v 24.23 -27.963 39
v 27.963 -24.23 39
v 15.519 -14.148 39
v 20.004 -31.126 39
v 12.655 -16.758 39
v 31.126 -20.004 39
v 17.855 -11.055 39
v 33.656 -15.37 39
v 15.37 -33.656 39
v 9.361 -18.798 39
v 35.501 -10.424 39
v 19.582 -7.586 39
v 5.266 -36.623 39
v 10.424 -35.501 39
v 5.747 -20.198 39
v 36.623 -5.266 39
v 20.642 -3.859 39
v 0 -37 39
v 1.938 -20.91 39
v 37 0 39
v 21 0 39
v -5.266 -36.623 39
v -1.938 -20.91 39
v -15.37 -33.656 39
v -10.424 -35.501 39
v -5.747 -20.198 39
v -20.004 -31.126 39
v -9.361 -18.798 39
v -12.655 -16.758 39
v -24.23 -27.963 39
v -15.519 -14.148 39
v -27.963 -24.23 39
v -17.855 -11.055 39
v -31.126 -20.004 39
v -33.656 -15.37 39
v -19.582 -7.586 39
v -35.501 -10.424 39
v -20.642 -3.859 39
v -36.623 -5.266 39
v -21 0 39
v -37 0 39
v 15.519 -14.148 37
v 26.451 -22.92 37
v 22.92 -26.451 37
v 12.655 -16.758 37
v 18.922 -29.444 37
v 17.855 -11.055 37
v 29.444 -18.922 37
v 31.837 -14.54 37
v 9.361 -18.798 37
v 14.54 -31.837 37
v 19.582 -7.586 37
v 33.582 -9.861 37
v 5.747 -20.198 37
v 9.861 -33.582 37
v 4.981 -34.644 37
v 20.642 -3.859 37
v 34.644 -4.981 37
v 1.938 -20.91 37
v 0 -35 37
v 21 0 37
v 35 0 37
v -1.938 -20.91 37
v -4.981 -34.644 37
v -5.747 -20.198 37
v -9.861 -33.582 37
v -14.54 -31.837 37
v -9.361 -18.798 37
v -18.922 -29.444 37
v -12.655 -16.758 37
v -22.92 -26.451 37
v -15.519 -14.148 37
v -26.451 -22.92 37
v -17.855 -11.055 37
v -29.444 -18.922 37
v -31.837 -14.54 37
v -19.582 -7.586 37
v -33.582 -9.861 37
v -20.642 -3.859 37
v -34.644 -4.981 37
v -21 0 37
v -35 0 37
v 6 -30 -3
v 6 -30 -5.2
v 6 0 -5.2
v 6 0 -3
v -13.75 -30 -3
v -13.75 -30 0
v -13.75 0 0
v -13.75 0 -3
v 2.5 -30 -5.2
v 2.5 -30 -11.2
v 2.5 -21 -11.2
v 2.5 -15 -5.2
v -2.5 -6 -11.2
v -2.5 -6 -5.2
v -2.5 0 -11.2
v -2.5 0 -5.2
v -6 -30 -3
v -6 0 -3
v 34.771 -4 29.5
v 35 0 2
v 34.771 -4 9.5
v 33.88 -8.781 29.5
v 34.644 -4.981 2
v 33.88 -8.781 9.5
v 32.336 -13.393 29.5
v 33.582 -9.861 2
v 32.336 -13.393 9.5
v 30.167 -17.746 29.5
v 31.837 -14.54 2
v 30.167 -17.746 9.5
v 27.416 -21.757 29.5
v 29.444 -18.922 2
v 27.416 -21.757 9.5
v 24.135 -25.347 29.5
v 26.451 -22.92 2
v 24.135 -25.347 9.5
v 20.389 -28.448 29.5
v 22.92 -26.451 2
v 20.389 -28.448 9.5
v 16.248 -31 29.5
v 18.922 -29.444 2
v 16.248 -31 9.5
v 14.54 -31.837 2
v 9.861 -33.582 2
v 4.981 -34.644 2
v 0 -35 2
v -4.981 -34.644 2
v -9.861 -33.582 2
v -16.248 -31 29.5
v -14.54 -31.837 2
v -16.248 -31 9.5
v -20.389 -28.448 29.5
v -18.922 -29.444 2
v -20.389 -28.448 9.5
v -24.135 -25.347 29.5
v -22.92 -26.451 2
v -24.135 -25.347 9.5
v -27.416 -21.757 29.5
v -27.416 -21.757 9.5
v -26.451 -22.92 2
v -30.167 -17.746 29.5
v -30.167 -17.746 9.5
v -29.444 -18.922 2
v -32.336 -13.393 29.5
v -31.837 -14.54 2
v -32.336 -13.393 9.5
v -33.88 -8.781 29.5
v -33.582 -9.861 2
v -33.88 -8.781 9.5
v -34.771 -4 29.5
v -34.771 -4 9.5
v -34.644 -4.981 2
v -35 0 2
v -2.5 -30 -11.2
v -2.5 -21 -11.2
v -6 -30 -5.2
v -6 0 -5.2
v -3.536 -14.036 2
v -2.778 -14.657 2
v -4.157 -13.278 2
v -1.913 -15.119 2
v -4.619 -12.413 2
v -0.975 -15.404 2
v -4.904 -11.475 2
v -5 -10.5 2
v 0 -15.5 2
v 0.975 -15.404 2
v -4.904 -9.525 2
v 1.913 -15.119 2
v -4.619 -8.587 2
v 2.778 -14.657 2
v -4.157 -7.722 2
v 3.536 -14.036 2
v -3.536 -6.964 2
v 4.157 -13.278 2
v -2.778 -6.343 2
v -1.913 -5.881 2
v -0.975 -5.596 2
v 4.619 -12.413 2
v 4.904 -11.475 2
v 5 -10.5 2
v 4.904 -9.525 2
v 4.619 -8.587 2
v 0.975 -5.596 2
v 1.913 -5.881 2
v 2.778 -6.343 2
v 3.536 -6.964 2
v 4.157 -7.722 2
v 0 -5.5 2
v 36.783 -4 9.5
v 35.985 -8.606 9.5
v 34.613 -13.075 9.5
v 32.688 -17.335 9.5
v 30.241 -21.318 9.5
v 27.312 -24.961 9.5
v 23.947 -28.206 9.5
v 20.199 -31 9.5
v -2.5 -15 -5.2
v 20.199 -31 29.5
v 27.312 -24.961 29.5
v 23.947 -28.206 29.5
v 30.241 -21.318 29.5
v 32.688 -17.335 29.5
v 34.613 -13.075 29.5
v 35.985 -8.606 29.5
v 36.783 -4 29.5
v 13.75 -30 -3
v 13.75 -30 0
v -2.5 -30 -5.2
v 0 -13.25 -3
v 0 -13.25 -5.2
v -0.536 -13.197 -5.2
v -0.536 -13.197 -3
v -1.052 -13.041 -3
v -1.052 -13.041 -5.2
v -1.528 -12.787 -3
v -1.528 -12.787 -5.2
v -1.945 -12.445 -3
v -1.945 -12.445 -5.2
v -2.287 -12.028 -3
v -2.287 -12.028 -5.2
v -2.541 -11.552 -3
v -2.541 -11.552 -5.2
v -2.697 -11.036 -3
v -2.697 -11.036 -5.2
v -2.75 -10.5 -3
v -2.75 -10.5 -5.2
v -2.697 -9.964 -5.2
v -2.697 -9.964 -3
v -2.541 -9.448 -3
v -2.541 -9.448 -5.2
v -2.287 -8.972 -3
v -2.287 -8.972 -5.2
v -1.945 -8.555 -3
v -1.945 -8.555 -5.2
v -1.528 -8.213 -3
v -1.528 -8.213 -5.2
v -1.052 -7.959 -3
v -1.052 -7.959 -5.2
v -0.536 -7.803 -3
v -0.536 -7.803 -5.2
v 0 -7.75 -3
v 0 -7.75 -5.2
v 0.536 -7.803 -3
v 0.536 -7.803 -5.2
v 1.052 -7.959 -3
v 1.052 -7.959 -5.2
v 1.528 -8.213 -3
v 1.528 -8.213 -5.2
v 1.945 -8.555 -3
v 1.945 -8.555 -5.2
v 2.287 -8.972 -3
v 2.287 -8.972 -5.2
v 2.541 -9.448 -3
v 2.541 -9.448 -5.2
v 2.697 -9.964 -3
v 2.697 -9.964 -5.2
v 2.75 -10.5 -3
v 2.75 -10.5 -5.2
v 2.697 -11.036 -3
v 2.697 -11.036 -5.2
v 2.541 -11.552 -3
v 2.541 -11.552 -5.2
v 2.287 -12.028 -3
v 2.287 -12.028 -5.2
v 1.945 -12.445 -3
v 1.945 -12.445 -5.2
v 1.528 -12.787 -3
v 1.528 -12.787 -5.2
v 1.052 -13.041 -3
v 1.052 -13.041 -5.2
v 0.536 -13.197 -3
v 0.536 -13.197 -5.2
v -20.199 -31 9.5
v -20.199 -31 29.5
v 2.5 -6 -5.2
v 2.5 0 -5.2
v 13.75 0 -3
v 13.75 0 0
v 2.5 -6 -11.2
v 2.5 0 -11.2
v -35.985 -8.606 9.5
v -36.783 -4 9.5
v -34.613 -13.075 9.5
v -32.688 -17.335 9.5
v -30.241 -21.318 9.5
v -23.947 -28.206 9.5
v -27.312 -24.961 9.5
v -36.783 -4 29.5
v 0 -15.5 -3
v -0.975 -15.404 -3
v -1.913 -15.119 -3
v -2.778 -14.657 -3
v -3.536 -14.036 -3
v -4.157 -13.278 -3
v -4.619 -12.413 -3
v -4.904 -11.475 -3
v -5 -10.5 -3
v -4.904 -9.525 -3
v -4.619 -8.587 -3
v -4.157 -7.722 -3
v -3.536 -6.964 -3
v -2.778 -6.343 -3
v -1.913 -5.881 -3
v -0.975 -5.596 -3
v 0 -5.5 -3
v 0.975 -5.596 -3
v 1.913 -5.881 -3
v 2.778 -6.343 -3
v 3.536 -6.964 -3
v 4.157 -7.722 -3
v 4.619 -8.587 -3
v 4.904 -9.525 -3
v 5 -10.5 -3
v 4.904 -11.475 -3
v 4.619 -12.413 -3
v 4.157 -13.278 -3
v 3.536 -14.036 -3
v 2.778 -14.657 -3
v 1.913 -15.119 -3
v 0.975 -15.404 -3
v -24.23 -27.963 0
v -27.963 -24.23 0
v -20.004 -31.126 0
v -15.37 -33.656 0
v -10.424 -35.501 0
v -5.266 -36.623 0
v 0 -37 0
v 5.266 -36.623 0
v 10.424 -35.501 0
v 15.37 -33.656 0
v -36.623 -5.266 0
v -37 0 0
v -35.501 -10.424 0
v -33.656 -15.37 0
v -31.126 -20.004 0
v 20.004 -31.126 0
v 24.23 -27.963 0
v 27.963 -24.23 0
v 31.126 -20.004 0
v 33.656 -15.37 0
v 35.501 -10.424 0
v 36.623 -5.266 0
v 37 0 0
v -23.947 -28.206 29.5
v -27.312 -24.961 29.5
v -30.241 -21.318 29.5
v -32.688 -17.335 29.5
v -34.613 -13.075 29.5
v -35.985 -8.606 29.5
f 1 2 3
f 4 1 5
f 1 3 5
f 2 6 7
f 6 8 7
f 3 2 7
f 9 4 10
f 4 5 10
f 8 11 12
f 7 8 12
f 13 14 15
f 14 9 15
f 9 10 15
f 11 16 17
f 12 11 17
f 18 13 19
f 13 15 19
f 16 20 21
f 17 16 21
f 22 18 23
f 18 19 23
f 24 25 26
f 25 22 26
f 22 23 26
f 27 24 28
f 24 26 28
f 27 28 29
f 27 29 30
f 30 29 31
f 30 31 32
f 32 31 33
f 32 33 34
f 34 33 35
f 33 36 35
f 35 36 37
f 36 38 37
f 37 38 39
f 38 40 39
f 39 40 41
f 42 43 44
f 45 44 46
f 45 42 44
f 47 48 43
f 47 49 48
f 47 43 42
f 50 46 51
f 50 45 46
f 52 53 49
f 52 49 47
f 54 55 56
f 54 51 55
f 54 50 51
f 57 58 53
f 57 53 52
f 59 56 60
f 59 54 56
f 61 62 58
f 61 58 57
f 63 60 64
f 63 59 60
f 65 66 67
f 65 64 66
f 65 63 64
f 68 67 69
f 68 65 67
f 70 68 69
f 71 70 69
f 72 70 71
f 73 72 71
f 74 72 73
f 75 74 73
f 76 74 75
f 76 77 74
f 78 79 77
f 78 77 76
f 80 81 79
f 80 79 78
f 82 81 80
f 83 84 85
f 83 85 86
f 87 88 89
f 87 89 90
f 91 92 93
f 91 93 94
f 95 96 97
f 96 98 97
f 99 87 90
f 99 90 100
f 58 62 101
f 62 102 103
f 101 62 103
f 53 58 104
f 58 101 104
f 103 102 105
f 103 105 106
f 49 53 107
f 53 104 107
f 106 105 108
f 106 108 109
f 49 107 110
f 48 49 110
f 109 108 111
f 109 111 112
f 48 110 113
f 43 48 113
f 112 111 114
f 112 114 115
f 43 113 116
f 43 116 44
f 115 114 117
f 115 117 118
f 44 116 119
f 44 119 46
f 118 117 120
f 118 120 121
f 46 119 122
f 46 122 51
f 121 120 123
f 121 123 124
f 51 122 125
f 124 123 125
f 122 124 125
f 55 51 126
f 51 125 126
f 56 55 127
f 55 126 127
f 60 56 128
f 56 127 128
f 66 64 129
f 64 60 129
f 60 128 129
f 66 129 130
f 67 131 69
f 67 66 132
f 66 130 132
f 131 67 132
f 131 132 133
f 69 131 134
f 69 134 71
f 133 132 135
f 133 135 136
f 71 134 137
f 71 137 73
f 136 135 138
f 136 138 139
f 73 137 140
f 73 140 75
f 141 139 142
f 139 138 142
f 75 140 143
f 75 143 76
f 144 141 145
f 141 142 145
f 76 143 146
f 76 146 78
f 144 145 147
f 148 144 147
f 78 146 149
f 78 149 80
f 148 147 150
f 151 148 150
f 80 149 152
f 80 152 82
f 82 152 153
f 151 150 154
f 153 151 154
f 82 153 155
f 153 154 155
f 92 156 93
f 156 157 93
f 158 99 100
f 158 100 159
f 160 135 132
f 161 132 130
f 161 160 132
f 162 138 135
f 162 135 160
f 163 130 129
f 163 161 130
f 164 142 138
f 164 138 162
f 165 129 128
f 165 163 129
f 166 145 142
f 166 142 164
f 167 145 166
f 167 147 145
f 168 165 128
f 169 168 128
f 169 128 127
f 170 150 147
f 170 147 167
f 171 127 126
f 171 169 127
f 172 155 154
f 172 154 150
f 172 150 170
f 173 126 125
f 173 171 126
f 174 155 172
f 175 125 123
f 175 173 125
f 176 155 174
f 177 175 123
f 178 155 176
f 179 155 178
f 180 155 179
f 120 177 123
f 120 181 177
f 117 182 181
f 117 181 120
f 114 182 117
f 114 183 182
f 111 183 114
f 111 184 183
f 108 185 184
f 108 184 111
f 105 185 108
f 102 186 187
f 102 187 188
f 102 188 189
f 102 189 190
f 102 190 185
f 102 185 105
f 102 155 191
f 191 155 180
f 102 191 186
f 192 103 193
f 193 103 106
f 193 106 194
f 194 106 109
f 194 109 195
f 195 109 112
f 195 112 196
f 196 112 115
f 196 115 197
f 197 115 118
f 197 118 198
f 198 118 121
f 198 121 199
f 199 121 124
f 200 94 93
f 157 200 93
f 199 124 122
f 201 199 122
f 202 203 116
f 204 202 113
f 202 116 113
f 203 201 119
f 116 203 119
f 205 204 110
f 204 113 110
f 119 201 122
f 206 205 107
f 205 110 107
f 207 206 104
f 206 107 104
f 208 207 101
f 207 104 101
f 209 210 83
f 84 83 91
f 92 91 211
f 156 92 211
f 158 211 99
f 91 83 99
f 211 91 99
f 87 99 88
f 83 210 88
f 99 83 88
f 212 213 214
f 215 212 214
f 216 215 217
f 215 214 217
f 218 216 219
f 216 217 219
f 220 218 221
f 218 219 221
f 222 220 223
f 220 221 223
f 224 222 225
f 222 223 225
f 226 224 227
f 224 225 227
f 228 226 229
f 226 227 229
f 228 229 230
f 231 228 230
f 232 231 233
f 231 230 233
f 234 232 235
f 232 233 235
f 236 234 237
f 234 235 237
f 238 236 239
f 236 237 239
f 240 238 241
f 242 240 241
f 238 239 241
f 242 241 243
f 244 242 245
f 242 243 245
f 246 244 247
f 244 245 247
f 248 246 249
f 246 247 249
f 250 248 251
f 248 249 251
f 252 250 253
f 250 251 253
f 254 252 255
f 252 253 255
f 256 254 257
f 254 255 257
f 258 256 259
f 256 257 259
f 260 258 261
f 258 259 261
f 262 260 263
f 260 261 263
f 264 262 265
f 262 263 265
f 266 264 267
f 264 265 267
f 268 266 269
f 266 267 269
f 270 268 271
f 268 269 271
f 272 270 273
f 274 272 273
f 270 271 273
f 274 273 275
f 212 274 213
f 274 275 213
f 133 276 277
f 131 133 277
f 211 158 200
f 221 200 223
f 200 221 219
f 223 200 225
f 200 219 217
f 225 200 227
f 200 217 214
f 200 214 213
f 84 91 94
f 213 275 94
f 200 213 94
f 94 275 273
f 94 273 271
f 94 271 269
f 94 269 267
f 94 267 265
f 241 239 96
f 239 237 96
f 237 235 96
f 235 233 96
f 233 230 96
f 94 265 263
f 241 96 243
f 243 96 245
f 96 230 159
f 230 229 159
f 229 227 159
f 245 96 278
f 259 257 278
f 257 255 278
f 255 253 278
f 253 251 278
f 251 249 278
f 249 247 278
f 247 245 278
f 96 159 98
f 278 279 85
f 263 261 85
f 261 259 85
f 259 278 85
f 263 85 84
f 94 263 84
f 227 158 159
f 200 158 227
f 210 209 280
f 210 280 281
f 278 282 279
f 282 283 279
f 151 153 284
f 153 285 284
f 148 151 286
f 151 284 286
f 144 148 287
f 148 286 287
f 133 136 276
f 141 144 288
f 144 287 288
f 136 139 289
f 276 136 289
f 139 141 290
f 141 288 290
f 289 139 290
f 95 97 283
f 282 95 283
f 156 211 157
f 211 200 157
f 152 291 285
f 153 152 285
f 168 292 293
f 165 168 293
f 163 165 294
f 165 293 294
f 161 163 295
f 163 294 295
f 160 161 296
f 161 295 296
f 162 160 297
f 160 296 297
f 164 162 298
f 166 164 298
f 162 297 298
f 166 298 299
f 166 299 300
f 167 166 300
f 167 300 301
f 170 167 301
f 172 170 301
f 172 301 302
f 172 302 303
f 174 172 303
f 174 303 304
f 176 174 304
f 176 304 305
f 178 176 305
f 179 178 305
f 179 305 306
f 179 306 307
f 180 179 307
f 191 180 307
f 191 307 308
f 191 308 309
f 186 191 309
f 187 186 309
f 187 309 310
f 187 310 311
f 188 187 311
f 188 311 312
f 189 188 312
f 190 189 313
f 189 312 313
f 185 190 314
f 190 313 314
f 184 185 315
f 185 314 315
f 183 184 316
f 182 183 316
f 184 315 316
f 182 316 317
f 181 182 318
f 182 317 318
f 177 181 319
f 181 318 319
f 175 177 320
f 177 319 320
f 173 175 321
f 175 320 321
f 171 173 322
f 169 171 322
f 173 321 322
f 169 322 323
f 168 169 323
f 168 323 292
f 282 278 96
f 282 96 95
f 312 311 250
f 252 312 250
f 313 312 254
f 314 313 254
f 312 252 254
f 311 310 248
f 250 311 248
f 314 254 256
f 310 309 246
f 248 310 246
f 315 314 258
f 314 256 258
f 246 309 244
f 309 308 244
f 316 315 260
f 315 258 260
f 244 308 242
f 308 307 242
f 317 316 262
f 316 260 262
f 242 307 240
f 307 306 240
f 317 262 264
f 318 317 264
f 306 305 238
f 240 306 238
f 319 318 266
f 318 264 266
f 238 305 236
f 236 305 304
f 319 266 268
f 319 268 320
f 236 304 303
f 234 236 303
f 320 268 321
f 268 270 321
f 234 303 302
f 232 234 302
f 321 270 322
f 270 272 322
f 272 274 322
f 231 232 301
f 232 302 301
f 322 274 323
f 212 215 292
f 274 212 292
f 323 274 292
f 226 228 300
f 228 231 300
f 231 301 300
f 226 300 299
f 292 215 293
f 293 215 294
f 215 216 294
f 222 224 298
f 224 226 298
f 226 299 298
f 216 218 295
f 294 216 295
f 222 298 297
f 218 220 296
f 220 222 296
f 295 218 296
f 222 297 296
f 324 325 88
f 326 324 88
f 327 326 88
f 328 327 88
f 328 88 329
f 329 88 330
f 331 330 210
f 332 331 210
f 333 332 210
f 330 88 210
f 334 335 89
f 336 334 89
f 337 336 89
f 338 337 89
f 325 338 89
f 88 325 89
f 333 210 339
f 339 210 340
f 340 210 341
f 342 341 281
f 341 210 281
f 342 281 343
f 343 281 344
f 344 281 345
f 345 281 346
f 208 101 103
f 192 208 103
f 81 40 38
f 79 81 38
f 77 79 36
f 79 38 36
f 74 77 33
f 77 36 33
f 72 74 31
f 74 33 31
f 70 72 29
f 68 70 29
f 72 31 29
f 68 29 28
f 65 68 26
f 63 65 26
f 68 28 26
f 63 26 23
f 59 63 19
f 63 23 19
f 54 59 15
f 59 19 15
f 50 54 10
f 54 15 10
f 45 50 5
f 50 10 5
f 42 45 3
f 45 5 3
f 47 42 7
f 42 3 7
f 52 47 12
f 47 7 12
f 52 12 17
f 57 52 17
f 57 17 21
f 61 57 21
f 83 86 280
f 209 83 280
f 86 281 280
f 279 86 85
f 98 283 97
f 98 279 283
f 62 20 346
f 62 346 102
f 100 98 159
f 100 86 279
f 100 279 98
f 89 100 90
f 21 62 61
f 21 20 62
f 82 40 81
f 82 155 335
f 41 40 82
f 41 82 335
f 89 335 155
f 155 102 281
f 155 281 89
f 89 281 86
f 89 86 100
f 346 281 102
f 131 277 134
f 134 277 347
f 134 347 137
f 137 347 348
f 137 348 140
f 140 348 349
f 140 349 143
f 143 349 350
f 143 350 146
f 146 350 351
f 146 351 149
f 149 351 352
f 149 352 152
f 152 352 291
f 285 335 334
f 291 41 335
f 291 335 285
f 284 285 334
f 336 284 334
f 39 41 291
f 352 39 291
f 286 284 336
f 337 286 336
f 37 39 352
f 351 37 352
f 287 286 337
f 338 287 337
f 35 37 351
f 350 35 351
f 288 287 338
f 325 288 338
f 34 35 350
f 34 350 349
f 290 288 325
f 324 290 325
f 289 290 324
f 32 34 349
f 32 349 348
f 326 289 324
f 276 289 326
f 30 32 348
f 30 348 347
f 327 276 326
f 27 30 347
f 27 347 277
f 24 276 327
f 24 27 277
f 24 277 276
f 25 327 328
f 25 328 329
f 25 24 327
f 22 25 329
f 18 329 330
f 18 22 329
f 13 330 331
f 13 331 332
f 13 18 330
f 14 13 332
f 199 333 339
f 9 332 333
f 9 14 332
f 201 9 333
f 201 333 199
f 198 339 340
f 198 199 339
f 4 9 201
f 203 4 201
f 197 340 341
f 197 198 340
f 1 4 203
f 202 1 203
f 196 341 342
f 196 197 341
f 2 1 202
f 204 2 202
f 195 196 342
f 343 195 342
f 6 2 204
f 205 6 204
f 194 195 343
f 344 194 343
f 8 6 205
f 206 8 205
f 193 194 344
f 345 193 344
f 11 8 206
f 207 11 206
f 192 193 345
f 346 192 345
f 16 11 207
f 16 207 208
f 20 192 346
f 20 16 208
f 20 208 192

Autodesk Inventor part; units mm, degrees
ref_plane "YZ Plane" through (0, 0, 0) normal (1, 0, 0) x (0, 1, 0)
ref_plane "XZ Plane" through (0, 0, 0) normal (0, 1, 0) x (-1, 0, 0)
ref_plane "XY Plane" through (0, 0, 0) normal (0, 0, 1) x (1, 0, 0)
sketch "Sketch1" plane through (0, 0, 0) normal (0, 0, 1) x (1, 0, 0)
  arc A0 (-37, 0) -> (37, 0) centre (0, 0) ccw
  line L0 (-51.8, 0) -> (51.8, 0) construction
  circle A1 centre (0, 0) radius 35 construction
  line L1 (-37, 0) -> (37, 0)
  dimension "d1" = 70
  dimension "d2" = 2
extrude "Extrusion1" add sketch "Sketch1" along normal blind 2
sketch "Sketch2" plane through (0, 0, 2) normal (0, 0, 1) x (1, 0, 0)
  arc A0 (-37, 0) -> (37, 0) centre (0, 0) ccw projected
  arc A1 (-35, 0) -> (35, 0) centre (0, 0) ccw
  line L0 (37, 0) -> (-37, 0) projected
  line L1 (-37, 0) -> (37, 0)
  dimension "d5" = 2
extrude "Extrusion2" add sketch "Sketch2" along normal blind 35 contours L0 A1 A0
ref_plane "Work Plane1" through (0, 0, 19.5) normal (0, 0, 1) x (1, 0, 0)
mirror "Mirror1" about plane through (0, 0, 19.5) normal (0, 0, 1) of "Extrusion1"
sketch "Sketch3" plane through (0, 0, 39) normal (0, 0, 1) x (1, 0, 0)
  circle A0 centre (0, 0) radius 21
  dimension "d8" = 42
extrude "Extrusion3" cut sketch "Sketch3" against normal blind 35
sketch "Sketch4" plane through (0, 0, 0) normal (1, 0, 0) x (0, 1, 0)
  line L0 (-4, 9.5) -> (-31, 9.5)
  line L1 (-31, 9.5) -> (-31, 29.5)
  line L2 (-31, 29.5) -> (-4, 29.5)
  line L3 (-4, 29.5) -> (-4, 9.5)
  line L4 (-44.4, 19.5) -> (7.4, 19.5) construction
  line L5 (0, 0) -> (0, 39) construction
  line L6 (-35, 37) -> (-35, 2) construction
  dimension "d11" = 20
  dimension "d12" = 4
  dimension "d13" = 4
extrude "Extrusion4" cut sketch "Sketch4" along normal through all both and the other way through all
sketch "Sketch5" plane through (0, 0, 0) normal (0, 1, 0) x (-1, 0, 0)
  line L0 (37, 0) -> (-37, 0) projected
  line L1 (0, -31.0583) -> (0, 50.6764) construction
  line L2 (-6, -3) -> (6, -3)
  line L3 (6, -3) -> (6, -5.2)
  line L4 (6, -5.2) -> (-6, -5.2)
  line L5 (-6, -5.2) -> (-6, -3)
  line L6 (-2.5, -5.2) -> (2.5, -5.2)
  line L7 (2.5, -5.2) -> (2.5, -11.2)
  line L8 (2.5, -11.2) -> (-2.5, -11.2)
  line L9 (-2.5, -11.2) -> (-2.5, -5.2)
  line L10 (0, -3) -> (0, -11.2) construction
  line L11 (-37, 0) -> (37, 0) construction
  line L12 (-13.75, 0) -> (13.75, 0)
  line L13 (13.75, 0) -> (13.75, -3)
  line L14 (13.75, -3) -> (-13.75, -3)
  line L15 (-13.75, -3) -> (-13.75, 0)
  dimension "d32" = 2.2
  dimension "d33" = 3.5
  dimension "d34" = 6
  dimension "d35" = 5
  dimension "d36" = 27.5
  dimension "d37" = 3
extrude "Extrusion5" add sketch "Sketch5" against normal blind 30
sketch "Sketch6" plane through (0, 0, 2) normal (0, 0, 1) x (1, 0, 0)
  line L0 (0, 0) -> (0, -21) construction
  arc A0 (-21, 0) -> (21, 0) centre (0, 0) ccw projected
  point P0 (0, -10.5)
hole "Hole1" at (0, -10.5, 2) direction (0, 0, -1) diameter 5.5 end through all counterbore diameter 10 counterbore depth 5 clearance for "Socket Head Cap Screw ISO 4762" size "M5" standard "ISO"
sketch "Sketch7" plane through (-2.5, -30, -11.2) normal (-1, 0, 0) x (0, 0, 1)
  line L0 (6, 30) -> (6, 0) projected
  line L1 (0, 30) -> (0, 20.6456) projected
  line L2 (0, 18.3544) -> (0, 0) projected
  line L3 (0, 15) -> (6, 15)
  line L4 (6, 15) -> (6, 24)
  line L5 (6, 24) -> (0, 24)
  line L6 (0, 24) -> (0, 15)
  line L7 (6, 18.3544) -> (0, 18.3544) construction
  line L8 (0, 19.5) -> (6, 19.5) construction
  line L9 (6, 15) -> (0, 9)
  line L10 (0, 15) -> (0, 9)
  line L11 (0, 20.6456) -> (6, 20.6456) construction
  point P0 (11.2, 30)
  point P1 (0, 24)
  dimension "d39" = 9
  dimension "d41" = 1.1456
  dimension "d42" = 45
  dimension "d45" = 1.1456
extrude "Extrusion6" cut sketch "Sketch7" along normal through all both and the other way through all
equation "\"d13\" = d12"
equation "\"d45\" = d41"
properties part number "Winddingshalter"
